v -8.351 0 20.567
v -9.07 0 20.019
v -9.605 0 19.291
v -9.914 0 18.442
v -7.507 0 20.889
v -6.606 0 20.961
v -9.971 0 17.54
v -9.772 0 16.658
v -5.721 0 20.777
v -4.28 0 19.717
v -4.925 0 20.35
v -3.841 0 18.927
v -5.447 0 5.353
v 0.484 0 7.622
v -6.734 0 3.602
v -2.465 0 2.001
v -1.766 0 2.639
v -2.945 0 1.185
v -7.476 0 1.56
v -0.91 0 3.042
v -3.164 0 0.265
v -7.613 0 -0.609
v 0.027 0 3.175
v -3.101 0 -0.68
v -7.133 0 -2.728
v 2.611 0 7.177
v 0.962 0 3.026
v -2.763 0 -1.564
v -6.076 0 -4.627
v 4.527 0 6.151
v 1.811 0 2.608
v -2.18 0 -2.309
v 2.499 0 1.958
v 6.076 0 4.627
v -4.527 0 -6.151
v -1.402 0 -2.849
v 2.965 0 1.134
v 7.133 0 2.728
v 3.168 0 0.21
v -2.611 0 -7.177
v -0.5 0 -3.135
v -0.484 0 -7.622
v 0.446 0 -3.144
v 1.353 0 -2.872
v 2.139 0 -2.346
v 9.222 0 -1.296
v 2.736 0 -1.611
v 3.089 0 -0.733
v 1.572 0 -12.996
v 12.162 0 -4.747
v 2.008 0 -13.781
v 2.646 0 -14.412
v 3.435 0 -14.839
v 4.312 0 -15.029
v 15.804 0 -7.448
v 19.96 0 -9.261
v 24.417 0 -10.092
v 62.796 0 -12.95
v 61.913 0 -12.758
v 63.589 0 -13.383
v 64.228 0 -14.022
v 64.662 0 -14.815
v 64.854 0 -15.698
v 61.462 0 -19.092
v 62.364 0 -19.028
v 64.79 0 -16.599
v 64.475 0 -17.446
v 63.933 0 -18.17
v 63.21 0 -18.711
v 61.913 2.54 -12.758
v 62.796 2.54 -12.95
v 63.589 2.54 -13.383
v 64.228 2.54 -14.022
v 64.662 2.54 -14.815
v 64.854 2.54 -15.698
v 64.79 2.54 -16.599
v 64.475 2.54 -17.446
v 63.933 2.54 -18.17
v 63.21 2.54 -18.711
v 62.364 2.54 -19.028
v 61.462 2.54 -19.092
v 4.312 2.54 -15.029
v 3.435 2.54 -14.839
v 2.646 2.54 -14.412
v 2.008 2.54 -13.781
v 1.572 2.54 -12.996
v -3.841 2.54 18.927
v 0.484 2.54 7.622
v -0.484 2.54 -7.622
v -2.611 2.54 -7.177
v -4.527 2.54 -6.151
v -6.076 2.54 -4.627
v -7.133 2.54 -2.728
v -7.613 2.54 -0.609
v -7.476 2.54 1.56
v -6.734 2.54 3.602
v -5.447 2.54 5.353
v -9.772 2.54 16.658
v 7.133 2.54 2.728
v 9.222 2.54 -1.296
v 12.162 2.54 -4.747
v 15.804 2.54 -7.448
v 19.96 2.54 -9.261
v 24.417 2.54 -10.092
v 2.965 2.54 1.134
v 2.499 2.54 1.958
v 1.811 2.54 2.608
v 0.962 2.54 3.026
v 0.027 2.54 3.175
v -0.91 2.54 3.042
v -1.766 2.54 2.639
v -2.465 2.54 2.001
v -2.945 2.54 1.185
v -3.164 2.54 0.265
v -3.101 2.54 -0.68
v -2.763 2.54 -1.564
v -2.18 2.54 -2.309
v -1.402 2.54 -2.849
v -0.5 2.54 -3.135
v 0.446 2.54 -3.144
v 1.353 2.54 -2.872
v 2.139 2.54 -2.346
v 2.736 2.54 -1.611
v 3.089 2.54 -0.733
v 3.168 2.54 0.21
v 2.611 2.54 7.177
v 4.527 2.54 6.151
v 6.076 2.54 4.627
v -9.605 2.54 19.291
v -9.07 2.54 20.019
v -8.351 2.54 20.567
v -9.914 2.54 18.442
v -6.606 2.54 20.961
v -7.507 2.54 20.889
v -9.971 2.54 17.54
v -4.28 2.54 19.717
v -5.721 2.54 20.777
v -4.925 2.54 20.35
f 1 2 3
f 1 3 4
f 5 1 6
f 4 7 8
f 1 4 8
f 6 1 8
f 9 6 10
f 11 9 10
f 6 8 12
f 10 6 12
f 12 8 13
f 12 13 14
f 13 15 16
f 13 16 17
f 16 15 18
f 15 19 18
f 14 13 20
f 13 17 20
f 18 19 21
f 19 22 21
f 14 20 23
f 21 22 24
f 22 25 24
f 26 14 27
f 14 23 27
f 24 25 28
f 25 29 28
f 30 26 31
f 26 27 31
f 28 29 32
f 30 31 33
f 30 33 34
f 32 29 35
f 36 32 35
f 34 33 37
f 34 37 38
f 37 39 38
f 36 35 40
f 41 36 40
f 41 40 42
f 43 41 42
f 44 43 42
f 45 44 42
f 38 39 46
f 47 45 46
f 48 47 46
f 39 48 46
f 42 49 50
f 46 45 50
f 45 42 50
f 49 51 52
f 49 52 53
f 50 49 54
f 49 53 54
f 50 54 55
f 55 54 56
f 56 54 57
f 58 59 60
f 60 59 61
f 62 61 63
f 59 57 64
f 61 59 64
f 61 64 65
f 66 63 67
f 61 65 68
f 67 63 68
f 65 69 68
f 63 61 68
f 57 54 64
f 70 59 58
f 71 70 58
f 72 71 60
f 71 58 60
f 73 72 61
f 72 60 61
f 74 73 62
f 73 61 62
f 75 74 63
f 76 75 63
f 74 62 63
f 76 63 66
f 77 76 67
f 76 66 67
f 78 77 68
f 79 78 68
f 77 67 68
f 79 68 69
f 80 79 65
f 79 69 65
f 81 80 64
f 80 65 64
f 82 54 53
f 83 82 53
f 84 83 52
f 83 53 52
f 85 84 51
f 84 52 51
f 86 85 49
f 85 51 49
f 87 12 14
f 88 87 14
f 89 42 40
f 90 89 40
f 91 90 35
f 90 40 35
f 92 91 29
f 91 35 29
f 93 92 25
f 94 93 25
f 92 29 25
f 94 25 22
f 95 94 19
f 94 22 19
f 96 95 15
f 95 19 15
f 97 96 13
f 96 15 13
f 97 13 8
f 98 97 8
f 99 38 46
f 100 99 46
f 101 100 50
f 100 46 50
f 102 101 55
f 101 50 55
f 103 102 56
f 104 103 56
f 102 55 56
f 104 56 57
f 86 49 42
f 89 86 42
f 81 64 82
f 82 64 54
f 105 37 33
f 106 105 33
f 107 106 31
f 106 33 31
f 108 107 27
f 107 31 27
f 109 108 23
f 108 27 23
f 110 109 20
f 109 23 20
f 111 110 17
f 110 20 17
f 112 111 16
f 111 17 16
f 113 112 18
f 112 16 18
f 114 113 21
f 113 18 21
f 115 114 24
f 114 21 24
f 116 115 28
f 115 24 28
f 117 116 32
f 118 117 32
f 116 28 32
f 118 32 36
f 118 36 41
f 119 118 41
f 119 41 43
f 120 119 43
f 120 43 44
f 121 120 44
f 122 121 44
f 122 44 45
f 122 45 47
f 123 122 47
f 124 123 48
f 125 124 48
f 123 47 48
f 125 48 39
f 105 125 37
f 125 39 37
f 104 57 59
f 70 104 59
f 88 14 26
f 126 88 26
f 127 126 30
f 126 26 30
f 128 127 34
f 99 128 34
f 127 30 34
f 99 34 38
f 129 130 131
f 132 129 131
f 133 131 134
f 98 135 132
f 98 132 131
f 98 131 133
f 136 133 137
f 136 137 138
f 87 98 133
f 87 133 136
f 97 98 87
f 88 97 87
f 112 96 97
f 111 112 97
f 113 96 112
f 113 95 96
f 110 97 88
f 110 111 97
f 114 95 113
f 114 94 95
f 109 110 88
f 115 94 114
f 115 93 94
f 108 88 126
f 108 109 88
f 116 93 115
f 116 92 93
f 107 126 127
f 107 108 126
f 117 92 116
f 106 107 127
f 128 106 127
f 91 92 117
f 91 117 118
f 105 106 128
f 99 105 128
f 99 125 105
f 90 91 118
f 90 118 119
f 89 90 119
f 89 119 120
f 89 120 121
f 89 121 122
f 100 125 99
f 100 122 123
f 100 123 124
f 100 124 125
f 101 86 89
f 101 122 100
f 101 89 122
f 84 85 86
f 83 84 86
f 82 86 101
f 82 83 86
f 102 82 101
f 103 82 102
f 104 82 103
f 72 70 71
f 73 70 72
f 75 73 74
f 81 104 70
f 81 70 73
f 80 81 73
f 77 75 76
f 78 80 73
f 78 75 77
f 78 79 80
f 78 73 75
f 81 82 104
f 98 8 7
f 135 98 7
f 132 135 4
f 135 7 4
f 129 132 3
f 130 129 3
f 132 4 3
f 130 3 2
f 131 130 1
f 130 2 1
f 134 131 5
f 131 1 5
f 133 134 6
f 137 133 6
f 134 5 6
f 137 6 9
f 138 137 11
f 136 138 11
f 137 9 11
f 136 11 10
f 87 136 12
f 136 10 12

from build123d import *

# Parameters (mm, degrees)
BOSS_EXTRUDE1_DEPTH = 2.54


with BuildPart() as part:
    # Sketch1 → Boss-Extrude1 (new body)
    with BuildSketch(Plane(origin=(0, 0, 0), x_dir=(1, 0, 0), z_dir=(0, 1, 0))):
        with BuildLine():
            Line((-5.44692552, -5.352823265), (-2.9654485, 1.134345711))
            Line((-2.9654485, 1.134345711), (-0.48397148, 7.621514688))
            ThreePointArc((-0.48397148, 7.621514688), (-7.132828761, 2.728455313), (-5.44692552, -5.352823265))
        make_face()
        with BuildLine():
            ThreePointArc((-2.9654485, 1.134345711), (1.134345711, 2.9654485), (2.9654485, -1.134345711))
            Line((2.9654485, -1.134345711), (5.44692552, 5.352823265))
            ThreePointArc((5.44692552, 5.352823265), (2.728455313, 7.132828761), (-0.48397148, 7.621514688))
            Line((-0.48397148, 7.621514688), (-2.9654485, 1.134345711))
        make_face()
        with BuildLine():
            Line((0.48397148, -7.621514688), (2.9654485, -1.134345711))
            ThreePointArc((2.9654485, -1.134345711), (-1.134345711, -2.9654485), (-2.9654485, 1.134345711))
            Line((-2.9654485, 1.134345711), (-5.44692552, -5.352823265))
            ThreePointArc((-5.44692552, -5.352823265), (-2.728455313, -7.132828761), (0.48397148, -7.621514688))
        make_face()
        with BuildLine():
            Line((5.44692552, 5.352823265), (2.9654485, -1.134345711))
            Line((2.9654485, -1.134345711), (0.48397148, -7.621514688))
            ThreePointArc((0.48397148, -7.621514688), (4.526523941, -6.150796334), (7.132828761, -2.728455313))
            ThreePointArc((7.132828761, -2.728455313), (7.50979921, -1.387310475), (7.636865491, 0))
            ThreePointArc((7.636865491, 0), (7.068208828, 2.891736243), (5.44692552, 5.352823265))
        make_face()
        with BuildLine():
            ThreePointArc((-0.48397148, 7.621514688), (2.728455313, 7.132828761), (5.44692552, 5.352823265))
            Line((5.44692552, 5.352823265), (6.780173427, 8.83824924))
            Line((6.780173427, 8.83824924), (4.762569184, 8.69478972))
            ThreePointArc((4.762569184, 8.69478972), (1.987351058, 9.970243609), (1.571934345, 12.996139712))
            Line((1.571934345, 12.996139712), (-0.48397148, 7.621514688))
        make_face()
        with BuildLine():
            Line((7.502831345, 10.727448289), (6.780173427, 8.83824924))
            Line((6.780173427, 8.83824924), (24.416674474, 10.092273154))
            Line((24.416674474, 10.092273154), (61.912569184, 12.758377306))
            ThreePointArc((61.912569184, 12.758377306), (64.854387126, 16.150567925), (61.462196506, 19.092385867))
            Line((61.462196506, 19.092385867), (4.312196506, 15.028798281))
            ThreePointArc((4.312196506, 15.028798281), (7.087414633, 13.753344392), (7.502831345, 10.727448289))
        make_face()
        with BuildLine():
            Line((6.780173427, 8.83824924), (5.44692552, 5.352823265))
            ThreePointArc((5.44692552, 5.352823265), (7.068208828, 2.891736243), (7.636865491, 0))
            ThreePointArc((7.636865491, 0), (7.50979921, -1.387310475), (7.132828761, -2.728455313))
            ThreePointArc((7.132828761, -2.728455313), (13.906300834, 6.200799727), (24.416674474, 10.092273154))
            Line((24.416674474, 10.092273154), (6.780173427, 8.83824924))
        make_face()
        with BuildLine():
            Line((4.762569184, 8.69478972), (6.780173427, 8.83824924))
            Line((6.780173427, 8.83824924), (7.502831345, 10.727448289))
            ThreePointArc((7.502831345, 10.727448289), (7.087414633, 13.753344392), (4.312196506, 15.028798281))
            ThreePointArc((4.312196506, 15.028798281), (2.645832454, 14.411825788), (1.571934345, 12.996139712))
            ThreePointArc((1.571934345, 12.996139712), (1.987351058, 9.970243609), (4.762569184, 8.69478972))
        make_face()
        with BuildLine():
            Line((-3.840625768, -18.927036712), (0.48397148, -7.621514688))
            ThreePointArc((0.48397148, -7.621514688), (-2.728455313, -7.132828761), (-5.44692552, -5.352823265))
            Line((-5.44692552, -5.352823265), (-9.771522768, -16.65834529))
            ThreePointArc((-9.771522768, -16.65834529), (-7.940419979, -20.758139501), (-3.840625768, -18.927036712))
        make_face()
    extrude(amount=BOSS_EXTRUDE1_DEPTH)


solid = part.part
